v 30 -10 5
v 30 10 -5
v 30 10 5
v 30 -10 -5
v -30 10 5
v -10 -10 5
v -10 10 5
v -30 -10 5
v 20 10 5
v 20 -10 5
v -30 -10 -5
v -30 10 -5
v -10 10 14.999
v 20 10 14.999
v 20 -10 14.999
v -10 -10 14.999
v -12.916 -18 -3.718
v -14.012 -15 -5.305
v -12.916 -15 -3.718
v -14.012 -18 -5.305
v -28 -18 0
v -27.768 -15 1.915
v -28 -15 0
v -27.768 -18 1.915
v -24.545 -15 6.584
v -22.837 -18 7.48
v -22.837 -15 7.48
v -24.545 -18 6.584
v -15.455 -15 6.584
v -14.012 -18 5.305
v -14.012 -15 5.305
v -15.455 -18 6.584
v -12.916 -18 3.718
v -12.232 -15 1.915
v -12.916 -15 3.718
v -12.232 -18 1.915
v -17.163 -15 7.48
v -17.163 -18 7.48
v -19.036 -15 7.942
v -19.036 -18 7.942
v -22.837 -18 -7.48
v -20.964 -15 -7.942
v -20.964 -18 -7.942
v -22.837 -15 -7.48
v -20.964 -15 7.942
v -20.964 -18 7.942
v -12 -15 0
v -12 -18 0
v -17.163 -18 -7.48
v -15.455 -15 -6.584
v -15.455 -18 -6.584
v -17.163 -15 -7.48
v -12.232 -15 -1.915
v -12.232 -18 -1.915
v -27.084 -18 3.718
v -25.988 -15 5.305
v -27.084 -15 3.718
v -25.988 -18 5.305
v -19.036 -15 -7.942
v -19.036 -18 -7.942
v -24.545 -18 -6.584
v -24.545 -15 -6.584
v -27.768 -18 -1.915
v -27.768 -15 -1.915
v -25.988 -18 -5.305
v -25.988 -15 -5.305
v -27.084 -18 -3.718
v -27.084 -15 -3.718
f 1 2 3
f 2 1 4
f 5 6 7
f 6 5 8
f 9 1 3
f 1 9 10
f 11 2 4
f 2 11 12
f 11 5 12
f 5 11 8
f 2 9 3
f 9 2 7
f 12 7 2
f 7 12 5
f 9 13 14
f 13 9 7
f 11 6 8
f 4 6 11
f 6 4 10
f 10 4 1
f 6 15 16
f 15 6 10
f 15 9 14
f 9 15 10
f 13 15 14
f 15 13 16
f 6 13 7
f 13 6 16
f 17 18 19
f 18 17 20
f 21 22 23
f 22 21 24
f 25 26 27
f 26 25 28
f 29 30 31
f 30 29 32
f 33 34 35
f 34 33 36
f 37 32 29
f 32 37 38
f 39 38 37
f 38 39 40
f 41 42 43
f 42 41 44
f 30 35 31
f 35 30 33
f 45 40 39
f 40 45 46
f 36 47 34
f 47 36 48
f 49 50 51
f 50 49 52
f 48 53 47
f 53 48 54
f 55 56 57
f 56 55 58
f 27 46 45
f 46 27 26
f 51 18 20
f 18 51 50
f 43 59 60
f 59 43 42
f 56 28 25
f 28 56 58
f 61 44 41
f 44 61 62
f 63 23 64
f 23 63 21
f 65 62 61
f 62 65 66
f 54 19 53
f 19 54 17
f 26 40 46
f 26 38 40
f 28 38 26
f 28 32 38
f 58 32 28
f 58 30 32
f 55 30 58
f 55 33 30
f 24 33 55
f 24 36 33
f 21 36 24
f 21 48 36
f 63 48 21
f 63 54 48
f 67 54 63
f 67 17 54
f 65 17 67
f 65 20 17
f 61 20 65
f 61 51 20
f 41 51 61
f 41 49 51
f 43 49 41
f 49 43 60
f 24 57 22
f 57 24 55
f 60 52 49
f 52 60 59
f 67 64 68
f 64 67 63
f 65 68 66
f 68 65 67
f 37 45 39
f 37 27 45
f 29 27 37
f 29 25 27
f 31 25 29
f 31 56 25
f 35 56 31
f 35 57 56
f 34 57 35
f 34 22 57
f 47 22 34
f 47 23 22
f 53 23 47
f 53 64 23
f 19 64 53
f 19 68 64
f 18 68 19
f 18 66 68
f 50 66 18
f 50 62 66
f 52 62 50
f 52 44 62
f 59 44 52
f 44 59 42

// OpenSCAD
cube([60,20,10],center=true);
translate([5,0,10 - 0.001])
    cube([30,20,10],center=true);
translate([-20,-15,0])
    rotate([90,0,0])
    cylinder(h=3,r=8);
